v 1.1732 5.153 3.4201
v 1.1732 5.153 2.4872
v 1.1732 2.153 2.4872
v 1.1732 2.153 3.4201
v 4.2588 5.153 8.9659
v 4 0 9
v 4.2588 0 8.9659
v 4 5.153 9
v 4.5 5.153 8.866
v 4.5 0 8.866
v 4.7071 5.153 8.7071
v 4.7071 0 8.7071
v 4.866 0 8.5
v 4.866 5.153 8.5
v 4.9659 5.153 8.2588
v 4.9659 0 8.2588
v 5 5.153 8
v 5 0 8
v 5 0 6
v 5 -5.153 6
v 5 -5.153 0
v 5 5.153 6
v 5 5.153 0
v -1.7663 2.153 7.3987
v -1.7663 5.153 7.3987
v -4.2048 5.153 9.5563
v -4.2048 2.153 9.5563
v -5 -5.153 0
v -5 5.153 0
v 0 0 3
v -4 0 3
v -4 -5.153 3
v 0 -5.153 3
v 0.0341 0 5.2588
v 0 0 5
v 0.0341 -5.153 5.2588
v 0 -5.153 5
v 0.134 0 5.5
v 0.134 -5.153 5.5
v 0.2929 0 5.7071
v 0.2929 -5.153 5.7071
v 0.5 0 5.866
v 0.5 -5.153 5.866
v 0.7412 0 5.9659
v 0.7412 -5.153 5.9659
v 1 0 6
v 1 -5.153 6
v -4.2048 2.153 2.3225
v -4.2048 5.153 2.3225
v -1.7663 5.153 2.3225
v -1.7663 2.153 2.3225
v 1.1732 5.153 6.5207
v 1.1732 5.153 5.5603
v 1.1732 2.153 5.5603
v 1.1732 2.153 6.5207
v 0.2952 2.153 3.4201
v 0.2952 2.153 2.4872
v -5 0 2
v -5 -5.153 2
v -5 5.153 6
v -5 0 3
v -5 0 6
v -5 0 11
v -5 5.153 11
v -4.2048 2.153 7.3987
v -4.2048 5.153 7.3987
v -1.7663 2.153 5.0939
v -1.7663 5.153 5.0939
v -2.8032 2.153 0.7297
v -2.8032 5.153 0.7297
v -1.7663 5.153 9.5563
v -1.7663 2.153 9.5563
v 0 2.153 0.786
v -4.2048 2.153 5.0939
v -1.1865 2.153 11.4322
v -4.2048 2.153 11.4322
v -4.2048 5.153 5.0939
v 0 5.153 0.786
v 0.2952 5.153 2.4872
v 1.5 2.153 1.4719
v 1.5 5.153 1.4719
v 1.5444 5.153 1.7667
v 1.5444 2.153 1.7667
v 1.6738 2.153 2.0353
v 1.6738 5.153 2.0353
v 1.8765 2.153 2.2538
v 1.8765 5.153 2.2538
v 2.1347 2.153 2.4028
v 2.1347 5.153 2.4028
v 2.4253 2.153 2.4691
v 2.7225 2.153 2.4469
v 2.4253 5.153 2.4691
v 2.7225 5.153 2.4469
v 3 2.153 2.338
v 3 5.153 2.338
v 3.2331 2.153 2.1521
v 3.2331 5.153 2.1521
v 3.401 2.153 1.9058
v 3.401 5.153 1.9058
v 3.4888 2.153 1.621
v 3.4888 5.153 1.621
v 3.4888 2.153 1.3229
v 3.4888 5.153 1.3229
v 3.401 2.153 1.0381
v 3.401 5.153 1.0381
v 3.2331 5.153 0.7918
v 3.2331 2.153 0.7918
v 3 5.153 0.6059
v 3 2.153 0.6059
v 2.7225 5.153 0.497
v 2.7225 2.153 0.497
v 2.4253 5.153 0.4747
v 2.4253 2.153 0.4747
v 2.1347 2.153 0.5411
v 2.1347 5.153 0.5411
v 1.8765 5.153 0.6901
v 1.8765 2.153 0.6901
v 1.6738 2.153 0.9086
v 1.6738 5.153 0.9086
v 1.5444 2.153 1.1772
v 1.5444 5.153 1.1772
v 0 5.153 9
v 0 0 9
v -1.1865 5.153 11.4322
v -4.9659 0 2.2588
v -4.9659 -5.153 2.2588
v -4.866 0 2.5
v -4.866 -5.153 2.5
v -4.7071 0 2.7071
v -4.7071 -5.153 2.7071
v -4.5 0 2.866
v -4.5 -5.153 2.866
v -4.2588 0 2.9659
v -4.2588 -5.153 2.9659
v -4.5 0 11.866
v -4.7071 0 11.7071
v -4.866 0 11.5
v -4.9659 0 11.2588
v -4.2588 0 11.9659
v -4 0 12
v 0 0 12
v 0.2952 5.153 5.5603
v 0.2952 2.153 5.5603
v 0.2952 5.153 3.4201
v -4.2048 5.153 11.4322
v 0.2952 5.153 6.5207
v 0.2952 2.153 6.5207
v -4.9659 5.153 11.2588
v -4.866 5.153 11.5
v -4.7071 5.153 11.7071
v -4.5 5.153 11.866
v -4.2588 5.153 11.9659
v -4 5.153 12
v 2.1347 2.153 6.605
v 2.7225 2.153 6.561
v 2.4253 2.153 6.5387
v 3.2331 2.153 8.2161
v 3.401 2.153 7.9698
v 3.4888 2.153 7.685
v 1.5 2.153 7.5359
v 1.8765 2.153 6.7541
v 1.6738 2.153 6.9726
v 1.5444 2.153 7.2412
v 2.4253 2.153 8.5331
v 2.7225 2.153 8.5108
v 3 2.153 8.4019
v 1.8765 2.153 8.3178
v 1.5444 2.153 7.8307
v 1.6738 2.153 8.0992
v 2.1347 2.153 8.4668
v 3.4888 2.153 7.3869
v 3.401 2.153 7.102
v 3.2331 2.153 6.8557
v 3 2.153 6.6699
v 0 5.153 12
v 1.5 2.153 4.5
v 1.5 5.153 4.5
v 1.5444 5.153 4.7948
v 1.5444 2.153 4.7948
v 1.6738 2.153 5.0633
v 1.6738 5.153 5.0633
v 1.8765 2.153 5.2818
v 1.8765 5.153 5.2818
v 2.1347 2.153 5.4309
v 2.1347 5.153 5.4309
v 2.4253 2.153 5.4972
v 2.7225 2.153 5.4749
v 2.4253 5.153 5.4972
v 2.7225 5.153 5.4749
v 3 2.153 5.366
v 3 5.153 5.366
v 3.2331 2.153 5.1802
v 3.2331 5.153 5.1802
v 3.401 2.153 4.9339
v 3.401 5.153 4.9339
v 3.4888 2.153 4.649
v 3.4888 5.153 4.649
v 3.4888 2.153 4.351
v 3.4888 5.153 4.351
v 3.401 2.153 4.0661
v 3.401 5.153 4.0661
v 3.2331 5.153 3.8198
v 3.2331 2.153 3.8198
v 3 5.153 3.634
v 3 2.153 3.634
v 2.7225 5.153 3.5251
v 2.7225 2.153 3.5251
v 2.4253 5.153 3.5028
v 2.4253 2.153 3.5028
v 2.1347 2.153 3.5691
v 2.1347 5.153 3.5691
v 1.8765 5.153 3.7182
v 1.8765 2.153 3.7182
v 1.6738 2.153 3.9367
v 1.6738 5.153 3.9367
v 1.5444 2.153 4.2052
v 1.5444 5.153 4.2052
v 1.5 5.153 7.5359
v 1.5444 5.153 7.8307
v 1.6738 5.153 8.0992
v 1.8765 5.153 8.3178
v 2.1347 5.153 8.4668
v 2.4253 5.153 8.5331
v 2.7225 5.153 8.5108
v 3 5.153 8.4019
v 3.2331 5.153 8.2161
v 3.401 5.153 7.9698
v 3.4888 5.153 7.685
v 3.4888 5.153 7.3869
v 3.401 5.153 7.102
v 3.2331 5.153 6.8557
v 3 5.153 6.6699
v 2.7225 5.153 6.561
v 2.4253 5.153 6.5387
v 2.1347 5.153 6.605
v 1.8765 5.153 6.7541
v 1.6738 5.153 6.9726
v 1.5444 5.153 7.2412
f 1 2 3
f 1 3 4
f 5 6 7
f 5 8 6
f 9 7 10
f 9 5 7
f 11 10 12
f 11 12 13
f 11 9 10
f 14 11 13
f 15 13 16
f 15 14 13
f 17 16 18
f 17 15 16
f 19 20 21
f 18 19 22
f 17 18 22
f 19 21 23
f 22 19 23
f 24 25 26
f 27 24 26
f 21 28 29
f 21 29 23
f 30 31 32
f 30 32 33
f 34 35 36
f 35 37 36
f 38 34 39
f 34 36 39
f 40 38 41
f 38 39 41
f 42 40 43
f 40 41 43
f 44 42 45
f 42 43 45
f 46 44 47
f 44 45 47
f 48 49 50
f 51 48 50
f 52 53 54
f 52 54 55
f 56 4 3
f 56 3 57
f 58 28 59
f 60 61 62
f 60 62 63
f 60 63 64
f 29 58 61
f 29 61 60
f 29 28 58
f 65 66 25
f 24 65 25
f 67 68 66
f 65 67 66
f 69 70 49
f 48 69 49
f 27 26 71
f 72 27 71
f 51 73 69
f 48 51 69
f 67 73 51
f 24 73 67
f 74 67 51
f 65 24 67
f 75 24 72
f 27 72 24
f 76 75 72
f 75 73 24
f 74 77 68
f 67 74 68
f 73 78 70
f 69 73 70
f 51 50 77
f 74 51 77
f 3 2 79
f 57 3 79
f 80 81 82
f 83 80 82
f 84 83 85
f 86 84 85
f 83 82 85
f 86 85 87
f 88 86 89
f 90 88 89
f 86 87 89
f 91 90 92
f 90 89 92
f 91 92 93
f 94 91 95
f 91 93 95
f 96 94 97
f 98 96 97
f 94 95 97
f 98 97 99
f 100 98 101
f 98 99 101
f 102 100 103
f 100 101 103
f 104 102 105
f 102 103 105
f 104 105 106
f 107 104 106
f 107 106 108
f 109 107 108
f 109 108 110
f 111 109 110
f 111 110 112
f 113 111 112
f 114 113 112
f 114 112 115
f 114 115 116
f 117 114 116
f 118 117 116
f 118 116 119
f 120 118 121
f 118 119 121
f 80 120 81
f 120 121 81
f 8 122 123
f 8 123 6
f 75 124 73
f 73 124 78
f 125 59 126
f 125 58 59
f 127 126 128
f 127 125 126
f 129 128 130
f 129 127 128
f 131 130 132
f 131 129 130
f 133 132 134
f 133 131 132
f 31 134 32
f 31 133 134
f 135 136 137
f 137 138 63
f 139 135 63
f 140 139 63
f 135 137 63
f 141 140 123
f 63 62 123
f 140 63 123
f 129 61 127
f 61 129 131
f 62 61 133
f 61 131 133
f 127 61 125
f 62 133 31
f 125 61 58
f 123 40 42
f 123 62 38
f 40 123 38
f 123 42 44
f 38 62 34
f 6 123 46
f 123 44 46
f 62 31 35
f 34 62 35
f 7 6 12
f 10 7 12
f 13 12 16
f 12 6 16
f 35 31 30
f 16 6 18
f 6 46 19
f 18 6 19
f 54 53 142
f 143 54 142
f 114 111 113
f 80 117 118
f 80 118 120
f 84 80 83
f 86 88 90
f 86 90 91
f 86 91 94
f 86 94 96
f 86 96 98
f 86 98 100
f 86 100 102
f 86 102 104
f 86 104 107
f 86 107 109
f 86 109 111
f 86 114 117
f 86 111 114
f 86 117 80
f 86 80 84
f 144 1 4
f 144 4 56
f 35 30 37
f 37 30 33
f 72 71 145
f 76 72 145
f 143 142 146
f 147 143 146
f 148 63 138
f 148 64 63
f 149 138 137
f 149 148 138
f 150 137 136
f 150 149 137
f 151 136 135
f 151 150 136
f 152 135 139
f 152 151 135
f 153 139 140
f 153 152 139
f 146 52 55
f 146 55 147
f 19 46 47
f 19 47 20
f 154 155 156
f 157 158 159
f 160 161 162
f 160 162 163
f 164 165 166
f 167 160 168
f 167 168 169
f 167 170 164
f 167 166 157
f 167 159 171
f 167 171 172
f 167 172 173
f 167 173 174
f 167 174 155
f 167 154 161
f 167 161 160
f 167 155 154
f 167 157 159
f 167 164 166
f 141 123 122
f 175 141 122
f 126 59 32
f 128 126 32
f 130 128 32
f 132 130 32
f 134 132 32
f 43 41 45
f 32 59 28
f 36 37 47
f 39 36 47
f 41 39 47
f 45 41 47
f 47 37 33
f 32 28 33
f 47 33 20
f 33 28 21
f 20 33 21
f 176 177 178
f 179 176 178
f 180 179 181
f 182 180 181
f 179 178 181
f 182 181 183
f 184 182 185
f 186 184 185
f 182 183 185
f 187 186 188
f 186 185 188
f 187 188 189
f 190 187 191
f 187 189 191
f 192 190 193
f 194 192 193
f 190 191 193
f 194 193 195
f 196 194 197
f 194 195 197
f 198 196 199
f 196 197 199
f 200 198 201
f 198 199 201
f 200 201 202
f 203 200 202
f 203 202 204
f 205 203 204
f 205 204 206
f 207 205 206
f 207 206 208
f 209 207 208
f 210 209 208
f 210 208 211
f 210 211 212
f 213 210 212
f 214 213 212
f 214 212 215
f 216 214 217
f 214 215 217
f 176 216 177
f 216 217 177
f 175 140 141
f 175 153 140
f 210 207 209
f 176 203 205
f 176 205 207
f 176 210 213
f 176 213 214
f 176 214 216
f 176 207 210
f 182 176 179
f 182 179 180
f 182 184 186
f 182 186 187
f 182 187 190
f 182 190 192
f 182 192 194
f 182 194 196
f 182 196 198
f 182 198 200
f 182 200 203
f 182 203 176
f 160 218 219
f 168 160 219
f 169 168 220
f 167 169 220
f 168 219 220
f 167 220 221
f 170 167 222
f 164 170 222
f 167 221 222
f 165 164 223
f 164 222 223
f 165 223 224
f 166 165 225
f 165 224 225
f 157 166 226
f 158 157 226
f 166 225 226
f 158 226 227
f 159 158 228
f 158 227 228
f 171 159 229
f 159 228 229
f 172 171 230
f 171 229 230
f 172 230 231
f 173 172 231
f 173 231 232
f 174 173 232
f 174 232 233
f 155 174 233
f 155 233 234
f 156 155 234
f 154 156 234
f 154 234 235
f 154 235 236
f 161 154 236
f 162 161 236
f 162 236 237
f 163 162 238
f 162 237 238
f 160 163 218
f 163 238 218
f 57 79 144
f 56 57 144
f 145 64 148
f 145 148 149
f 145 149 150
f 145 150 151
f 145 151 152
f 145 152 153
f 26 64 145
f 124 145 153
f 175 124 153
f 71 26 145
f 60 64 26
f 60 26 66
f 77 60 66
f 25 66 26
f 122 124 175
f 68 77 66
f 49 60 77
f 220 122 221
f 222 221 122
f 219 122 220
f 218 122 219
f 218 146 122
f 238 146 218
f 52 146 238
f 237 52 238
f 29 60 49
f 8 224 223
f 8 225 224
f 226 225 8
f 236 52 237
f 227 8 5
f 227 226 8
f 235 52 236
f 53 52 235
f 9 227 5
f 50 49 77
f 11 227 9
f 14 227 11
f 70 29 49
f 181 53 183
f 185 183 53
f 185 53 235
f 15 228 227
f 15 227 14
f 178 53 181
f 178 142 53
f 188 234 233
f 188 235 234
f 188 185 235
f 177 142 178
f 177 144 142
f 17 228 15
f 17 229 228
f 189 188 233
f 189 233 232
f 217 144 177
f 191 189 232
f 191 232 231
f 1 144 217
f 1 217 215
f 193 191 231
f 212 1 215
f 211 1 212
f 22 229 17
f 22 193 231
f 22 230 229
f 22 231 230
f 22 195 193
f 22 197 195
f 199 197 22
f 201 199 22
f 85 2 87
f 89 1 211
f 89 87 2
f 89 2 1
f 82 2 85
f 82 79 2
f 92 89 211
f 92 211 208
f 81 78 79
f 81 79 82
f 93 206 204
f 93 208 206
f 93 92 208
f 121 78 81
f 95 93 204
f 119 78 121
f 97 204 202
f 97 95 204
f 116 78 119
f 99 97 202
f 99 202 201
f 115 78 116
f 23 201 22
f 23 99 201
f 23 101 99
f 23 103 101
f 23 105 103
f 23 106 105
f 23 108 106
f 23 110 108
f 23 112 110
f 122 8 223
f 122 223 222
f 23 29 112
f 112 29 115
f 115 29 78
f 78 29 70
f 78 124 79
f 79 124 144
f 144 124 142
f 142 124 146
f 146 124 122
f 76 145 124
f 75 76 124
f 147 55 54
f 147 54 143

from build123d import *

# Parameters (mm, degrees)
F0_W     = 10
F0_H     = 10.306037739
F1_DEPTH = 3
F3_DEPTH = 3
F4_W     = 10
F4_H     = 5.1530188695
F5_DEPTH = 3
F6_W     = 5
F6_H     = 5.1530188695
F7_DEPTH = 3
F8_R     = 1
F8_W     = 0.8780423959
F8_H     = 0.9329200257
F8_W_2   = 0.8780424541
F8_H_2   = 0.9603588842
F9_DEPTH = 3
F10_R    = 1


with BuildPart() as f1:
    # F0 (on Top) → F1 (new body)
    with BuildSketch(Plane.XY):
        Rectangle(F0_W, F0_H)
    extrude(amount=F1_DEPTH)

    # F2 (on face) → F3 (join)
    with BuildSketch(Plane.XY.offset(3)):
        Polygon((-5, 5.1530188695), (-5, 0), (0, 0), (0, -5.1530188695), (5, -5.1530188695), (5, 5.1530188695), (-2.5035347862, 5.1530188695), align=None)
    extrude(amount=F3_DEPTH)

    # F4 (on face) → F5 (join)
    with BuildSketch(Plane.XY.offset(6)):
        with Locations((0, 2.5765094348)):
            Rectangle(F4_W, F4_H)
    extrude(amount=F5_DEPTH)

    # F6 (on face) → F7 (join)
    with BuildSketch(Plane.XY.offset(9)):
        with Locations((-2.5, 2.5765094348)):
            Rectangle(F6_W, F6_H)
    extrude(amount=F7_DEPTH)

    # F8 (on face) → F9 (cut)
    with BuildSketch(Plane(origin=(0, 5.1530188695, 0), x_dir=(-1, 0, 0), z_dir=(0, 1, 0))):
        with Locations((-2.5, 7.5359190814)):
            Circle(F8_R)
        with Locations((-2.5, 4.5)):
            Circle(F8_R)
        with Locations((-2.5, 1.4719393803)):
            Circle(F8_R)
        with Locations((-0.7341963501, 2.9536358779)):
            Rectangle(F8_W, F8_H)
        with Locations((-0.734196321, 6.0405035038)):
            Rectangle(F8_W_2, F8_H_2)
        Polygon((1.1865213746, 11.4322323352), (0, 0.7859683246), (2.8032438053, 0.729703495), (4.2047919706, 2.322542714), (1.7662906772, 2.322542714), (4.2047919706, 5.0938641652), (1.7662906772, 5.0938641652), (4.2047919706, 7.3987250216), (1.7662906772, 7.3987250216), (4.2047919706, 9.5562967831), (1.7662906772, 9.5562967831), (4.2047919706, 11.4322323352), align=None)
    extrude(amount=-F9_DEPTH, mode=Mode.SUBTRACT)

    # F10
    f10_edges = [f1.edges().sort_by_distance(p)[0] for p in [
        (-5, 2.576509, 12),
        (5, 2.576509, 9),
        (0, -2.576509, 6),
        (-5, -2.576509, 3),
    ]]
    fillet(f10_edges, radius=F10_R)


solid = f1.part
